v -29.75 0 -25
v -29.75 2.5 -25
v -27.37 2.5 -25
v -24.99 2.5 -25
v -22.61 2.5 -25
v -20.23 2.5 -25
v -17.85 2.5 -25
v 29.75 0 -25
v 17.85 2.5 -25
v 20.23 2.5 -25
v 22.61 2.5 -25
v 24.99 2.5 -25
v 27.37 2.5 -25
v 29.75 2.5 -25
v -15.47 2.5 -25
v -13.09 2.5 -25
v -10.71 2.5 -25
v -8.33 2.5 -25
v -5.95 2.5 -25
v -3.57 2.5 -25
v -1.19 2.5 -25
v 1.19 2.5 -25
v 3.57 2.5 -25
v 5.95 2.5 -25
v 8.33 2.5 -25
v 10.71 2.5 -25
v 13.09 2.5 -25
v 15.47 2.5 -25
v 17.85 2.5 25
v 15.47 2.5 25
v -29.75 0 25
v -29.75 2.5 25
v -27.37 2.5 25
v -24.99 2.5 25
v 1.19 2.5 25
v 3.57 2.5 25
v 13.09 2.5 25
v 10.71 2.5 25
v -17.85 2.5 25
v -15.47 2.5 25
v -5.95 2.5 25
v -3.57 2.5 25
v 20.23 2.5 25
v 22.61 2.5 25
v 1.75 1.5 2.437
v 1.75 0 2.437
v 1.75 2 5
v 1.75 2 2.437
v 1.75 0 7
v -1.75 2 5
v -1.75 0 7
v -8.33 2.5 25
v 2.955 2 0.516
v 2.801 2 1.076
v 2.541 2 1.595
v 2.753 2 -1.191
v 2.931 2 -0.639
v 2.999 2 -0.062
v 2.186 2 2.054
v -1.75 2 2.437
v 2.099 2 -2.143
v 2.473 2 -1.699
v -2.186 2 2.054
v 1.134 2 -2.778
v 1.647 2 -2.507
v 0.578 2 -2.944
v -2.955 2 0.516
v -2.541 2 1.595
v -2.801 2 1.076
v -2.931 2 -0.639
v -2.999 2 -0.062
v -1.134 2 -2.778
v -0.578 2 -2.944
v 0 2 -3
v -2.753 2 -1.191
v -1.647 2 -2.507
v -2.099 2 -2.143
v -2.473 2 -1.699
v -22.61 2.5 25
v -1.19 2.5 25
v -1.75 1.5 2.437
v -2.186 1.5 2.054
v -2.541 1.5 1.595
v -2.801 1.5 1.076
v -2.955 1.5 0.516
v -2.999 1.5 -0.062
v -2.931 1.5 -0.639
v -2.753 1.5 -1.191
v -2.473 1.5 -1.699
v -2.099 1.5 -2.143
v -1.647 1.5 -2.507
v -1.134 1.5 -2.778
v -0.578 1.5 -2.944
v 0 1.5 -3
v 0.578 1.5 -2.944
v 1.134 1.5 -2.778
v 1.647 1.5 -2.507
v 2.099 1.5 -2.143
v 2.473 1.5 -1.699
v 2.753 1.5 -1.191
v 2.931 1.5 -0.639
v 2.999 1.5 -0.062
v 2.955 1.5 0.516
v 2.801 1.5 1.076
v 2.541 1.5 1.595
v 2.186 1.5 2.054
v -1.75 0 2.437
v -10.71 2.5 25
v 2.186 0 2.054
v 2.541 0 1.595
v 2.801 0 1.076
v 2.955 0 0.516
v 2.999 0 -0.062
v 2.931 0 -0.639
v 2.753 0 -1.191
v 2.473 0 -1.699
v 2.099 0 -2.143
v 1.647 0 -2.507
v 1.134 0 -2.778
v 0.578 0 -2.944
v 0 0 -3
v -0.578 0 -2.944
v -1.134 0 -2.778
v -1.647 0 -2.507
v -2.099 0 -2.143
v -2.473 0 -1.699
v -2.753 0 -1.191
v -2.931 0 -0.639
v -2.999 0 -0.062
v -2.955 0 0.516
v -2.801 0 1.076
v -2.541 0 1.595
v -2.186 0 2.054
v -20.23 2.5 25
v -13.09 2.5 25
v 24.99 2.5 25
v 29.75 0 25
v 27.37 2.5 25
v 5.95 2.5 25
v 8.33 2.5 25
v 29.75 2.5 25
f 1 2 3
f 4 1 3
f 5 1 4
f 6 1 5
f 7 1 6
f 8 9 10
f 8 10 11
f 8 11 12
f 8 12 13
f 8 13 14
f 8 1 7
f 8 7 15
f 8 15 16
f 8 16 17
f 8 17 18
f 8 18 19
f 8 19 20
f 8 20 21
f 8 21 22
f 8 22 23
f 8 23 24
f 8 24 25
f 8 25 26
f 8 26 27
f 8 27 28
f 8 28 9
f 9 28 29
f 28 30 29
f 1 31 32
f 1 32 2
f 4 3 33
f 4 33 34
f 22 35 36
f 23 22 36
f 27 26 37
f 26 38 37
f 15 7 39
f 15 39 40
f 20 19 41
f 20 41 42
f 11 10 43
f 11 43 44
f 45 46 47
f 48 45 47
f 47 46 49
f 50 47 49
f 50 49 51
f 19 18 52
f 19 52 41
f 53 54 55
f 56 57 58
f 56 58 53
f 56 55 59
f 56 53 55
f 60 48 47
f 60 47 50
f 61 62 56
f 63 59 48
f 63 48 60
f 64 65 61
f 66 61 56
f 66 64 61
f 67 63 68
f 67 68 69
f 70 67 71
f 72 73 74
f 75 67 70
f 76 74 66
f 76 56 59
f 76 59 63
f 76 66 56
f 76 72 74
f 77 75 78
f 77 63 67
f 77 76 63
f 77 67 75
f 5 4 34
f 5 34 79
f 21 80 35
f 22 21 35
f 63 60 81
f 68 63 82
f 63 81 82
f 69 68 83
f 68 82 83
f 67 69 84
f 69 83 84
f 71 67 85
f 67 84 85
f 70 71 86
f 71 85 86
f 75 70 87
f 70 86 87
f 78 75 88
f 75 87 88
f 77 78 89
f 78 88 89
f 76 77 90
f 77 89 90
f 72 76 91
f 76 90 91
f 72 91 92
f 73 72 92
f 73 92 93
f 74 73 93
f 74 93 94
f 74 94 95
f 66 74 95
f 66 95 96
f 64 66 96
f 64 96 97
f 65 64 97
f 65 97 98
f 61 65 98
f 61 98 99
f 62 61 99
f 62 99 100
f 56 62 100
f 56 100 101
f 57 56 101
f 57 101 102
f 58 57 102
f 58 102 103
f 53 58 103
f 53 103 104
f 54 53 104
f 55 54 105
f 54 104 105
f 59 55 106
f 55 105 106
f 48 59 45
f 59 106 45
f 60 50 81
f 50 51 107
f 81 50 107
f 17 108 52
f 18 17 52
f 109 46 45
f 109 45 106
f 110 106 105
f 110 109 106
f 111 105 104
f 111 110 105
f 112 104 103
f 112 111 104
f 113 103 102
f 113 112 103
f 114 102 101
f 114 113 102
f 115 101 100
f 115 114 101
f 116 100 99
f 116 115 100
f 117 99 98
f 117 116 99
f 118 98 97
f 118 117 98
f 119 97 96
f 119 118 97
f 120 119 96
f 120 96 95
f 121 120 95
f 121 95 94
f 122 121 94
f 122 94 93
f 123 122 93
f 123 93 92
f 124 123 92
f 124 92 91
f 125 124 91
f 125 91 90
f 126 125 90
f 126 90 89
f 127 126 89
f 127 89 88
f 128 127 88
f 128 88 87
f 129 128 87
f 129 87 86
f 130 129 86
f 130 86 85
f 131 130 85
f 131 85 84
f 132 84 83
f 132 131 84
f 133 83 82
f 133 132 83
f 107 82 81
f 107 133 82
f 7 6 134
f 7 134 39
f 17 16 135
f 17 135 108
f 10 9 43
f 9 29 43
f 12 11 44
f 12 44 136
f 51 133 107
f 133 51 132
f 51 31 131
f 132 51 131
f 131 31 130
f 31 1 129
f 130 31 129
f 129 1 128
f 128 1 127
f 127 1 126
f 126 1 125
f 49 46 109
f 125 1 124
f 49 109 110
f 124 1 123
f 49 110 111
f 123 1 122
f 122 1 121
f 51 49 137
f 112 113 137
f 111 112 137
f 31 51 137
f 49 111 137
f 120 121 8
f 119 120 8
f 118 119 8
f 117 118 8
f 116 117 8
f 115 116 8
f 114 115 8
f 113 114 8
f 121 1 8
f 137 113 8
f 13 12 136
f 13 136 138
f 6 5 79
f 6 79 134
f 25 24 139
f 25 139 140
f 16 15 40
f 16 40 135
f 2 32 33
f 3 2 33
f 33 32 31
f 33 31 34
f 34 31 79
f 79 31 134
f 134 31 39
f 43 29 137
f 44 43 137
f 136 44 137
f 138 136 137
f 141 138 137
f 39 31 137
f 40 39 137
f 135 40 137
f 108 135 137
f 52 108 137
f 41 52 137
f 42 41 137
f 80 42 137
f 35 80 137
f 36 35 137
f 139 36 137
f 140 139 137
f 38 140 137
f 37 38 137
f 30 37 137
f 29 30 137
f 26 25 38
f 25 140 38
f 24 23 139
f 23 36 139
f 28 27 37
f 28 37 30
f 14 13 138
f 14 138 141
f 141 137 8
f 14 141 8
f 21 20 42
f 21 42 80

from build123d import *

# Parameters (mm, degrees)
SKETCH1_W           = 59.5
SKETCH1_H           = 50
SKETCH1_R           = 3
BOSS_EXTRUDE1_DEPTH = 1.5
BOSS_EXTRUDE2_DEPTH = 50
CUT_EXTRUDE1_DEPTH  = 2
CHAMFER1_SIZE       = 2
SKETCH4_W           = 59.5
SKETCH4_H           = 1.892701509
CUT_EXTRUDE2_DEPTH  = 59.318629099


with BuildPart() as part:
    # Sketch1 → Boss-Extrude1 (new body)
    with BuildSketch(Plane(origin=(0, 0, 0), x_dir=(1, 0, 0), z_dir=(0, 1, 0))):
        Rectangle(SKETCH1_W, SKETCH1_H)
        with Locations(Location((0, 0, 0), (0, 0, 270))):
            Circle(SKETCH1_R, mode=Mode.SUBTRACT)
    extrude(amount=BOSS_EXTRUDE1_DEPTH)

    # Sketch2 → Boss-Extrude2 (add)
    with BuildSketch(Plane(origin=(0, 0, -25), x_dir=(-1, 0, 0), z_dir=(0, 0, -1))):
        Polygon((-29.75, 1.5), (29.75, 1.5), (29.75, 2.5), (28.56, 4), (27.37, 2.5), (26.18, 4), (24.99, 2.5), (23.8, 4), (22.61, 2.5), (21.42, 4), (20.23, 2.5), (19.04, 4), (17.85, 2.5), (16.66, 4), (15.47, 2.5), (14.28, 4), (13.09, 2.5), (11.9, 4), (10.71, 2.5), (9.52, 4), (8.33, 2.5), (7.14, 4), (5.95, 2.5), (4.76, 4), (3.57, 2.5), (2.38, 4), (1.19, 2.5), (0, 4), (-1.19, 2.5), (-2.38, 4), (-3.57, 2.5), (-4.76, 4), (-5.95, 2.5), (-7.14, 4), (-8.33, 2.5), (-9.52, 4), (-10.71, 2.5), (-11.9, 4), (-13.09, 2.5), (-14.28, 4), (-15.47, 2.5), (-16.66, 4), (-17.85, 2.5), (-19.04, 4), (-20.23, 2.5), (-21.42, 4), (-22.61, 2.5), (-23.8, 4), (-24.99, 2.5), (-26.18, 4), (-27.37, 2.5), (-28.56, 4), (-29.75, 2.5), align=None)
    extrude(amount=-BOSS_EXTRUDE2_DEPTH)

    # Sketch3 → Cut-Extrude1 (cut)
    with BuildSketch(Plane(origin=(0, 0, 0), x_dir=(-1, 0, 0), z_dir=(0, -1, 0))):
        with BuildLine():
            Line((-1.75, -2.436698586), (-1.75, -5))
            Line((-1.75, -5), (1.75, -5))
            Line((1.75, -5), (1.75, -2.436698586))
            ThreePointArc((1.75, -2.436698586), (0, 3), (-1.75, -2.436698586))
        make_face()
    extrude(amount=-CUT_EXTRUDE1_DEPTH, mode=Mode.SUBTRACT)

    # Chamfer1
    chamfer1_edges = [part.edges().sort_by_distance(p)[0] for p in [
        (0, 0, 5),
    ]]
    chamfer(chamfer1_edges, length=CHAMFER1_SIZE - 0.0001)  # a hair under: the kernel refuses the full size

    # Sketch4 → Cut-Extrude2 (cut, through all)
    with BuildSketch(Plane.XY.offset(25)):
        with Locations((0, 3.446350755)):
            Rectangle(SKETCH4_W, SKETCH4_H)
    extrude(amount=-CUT_EXTRUDE2_DEPTH, mode=Mode.SUBTRACT)


solid = part.part
